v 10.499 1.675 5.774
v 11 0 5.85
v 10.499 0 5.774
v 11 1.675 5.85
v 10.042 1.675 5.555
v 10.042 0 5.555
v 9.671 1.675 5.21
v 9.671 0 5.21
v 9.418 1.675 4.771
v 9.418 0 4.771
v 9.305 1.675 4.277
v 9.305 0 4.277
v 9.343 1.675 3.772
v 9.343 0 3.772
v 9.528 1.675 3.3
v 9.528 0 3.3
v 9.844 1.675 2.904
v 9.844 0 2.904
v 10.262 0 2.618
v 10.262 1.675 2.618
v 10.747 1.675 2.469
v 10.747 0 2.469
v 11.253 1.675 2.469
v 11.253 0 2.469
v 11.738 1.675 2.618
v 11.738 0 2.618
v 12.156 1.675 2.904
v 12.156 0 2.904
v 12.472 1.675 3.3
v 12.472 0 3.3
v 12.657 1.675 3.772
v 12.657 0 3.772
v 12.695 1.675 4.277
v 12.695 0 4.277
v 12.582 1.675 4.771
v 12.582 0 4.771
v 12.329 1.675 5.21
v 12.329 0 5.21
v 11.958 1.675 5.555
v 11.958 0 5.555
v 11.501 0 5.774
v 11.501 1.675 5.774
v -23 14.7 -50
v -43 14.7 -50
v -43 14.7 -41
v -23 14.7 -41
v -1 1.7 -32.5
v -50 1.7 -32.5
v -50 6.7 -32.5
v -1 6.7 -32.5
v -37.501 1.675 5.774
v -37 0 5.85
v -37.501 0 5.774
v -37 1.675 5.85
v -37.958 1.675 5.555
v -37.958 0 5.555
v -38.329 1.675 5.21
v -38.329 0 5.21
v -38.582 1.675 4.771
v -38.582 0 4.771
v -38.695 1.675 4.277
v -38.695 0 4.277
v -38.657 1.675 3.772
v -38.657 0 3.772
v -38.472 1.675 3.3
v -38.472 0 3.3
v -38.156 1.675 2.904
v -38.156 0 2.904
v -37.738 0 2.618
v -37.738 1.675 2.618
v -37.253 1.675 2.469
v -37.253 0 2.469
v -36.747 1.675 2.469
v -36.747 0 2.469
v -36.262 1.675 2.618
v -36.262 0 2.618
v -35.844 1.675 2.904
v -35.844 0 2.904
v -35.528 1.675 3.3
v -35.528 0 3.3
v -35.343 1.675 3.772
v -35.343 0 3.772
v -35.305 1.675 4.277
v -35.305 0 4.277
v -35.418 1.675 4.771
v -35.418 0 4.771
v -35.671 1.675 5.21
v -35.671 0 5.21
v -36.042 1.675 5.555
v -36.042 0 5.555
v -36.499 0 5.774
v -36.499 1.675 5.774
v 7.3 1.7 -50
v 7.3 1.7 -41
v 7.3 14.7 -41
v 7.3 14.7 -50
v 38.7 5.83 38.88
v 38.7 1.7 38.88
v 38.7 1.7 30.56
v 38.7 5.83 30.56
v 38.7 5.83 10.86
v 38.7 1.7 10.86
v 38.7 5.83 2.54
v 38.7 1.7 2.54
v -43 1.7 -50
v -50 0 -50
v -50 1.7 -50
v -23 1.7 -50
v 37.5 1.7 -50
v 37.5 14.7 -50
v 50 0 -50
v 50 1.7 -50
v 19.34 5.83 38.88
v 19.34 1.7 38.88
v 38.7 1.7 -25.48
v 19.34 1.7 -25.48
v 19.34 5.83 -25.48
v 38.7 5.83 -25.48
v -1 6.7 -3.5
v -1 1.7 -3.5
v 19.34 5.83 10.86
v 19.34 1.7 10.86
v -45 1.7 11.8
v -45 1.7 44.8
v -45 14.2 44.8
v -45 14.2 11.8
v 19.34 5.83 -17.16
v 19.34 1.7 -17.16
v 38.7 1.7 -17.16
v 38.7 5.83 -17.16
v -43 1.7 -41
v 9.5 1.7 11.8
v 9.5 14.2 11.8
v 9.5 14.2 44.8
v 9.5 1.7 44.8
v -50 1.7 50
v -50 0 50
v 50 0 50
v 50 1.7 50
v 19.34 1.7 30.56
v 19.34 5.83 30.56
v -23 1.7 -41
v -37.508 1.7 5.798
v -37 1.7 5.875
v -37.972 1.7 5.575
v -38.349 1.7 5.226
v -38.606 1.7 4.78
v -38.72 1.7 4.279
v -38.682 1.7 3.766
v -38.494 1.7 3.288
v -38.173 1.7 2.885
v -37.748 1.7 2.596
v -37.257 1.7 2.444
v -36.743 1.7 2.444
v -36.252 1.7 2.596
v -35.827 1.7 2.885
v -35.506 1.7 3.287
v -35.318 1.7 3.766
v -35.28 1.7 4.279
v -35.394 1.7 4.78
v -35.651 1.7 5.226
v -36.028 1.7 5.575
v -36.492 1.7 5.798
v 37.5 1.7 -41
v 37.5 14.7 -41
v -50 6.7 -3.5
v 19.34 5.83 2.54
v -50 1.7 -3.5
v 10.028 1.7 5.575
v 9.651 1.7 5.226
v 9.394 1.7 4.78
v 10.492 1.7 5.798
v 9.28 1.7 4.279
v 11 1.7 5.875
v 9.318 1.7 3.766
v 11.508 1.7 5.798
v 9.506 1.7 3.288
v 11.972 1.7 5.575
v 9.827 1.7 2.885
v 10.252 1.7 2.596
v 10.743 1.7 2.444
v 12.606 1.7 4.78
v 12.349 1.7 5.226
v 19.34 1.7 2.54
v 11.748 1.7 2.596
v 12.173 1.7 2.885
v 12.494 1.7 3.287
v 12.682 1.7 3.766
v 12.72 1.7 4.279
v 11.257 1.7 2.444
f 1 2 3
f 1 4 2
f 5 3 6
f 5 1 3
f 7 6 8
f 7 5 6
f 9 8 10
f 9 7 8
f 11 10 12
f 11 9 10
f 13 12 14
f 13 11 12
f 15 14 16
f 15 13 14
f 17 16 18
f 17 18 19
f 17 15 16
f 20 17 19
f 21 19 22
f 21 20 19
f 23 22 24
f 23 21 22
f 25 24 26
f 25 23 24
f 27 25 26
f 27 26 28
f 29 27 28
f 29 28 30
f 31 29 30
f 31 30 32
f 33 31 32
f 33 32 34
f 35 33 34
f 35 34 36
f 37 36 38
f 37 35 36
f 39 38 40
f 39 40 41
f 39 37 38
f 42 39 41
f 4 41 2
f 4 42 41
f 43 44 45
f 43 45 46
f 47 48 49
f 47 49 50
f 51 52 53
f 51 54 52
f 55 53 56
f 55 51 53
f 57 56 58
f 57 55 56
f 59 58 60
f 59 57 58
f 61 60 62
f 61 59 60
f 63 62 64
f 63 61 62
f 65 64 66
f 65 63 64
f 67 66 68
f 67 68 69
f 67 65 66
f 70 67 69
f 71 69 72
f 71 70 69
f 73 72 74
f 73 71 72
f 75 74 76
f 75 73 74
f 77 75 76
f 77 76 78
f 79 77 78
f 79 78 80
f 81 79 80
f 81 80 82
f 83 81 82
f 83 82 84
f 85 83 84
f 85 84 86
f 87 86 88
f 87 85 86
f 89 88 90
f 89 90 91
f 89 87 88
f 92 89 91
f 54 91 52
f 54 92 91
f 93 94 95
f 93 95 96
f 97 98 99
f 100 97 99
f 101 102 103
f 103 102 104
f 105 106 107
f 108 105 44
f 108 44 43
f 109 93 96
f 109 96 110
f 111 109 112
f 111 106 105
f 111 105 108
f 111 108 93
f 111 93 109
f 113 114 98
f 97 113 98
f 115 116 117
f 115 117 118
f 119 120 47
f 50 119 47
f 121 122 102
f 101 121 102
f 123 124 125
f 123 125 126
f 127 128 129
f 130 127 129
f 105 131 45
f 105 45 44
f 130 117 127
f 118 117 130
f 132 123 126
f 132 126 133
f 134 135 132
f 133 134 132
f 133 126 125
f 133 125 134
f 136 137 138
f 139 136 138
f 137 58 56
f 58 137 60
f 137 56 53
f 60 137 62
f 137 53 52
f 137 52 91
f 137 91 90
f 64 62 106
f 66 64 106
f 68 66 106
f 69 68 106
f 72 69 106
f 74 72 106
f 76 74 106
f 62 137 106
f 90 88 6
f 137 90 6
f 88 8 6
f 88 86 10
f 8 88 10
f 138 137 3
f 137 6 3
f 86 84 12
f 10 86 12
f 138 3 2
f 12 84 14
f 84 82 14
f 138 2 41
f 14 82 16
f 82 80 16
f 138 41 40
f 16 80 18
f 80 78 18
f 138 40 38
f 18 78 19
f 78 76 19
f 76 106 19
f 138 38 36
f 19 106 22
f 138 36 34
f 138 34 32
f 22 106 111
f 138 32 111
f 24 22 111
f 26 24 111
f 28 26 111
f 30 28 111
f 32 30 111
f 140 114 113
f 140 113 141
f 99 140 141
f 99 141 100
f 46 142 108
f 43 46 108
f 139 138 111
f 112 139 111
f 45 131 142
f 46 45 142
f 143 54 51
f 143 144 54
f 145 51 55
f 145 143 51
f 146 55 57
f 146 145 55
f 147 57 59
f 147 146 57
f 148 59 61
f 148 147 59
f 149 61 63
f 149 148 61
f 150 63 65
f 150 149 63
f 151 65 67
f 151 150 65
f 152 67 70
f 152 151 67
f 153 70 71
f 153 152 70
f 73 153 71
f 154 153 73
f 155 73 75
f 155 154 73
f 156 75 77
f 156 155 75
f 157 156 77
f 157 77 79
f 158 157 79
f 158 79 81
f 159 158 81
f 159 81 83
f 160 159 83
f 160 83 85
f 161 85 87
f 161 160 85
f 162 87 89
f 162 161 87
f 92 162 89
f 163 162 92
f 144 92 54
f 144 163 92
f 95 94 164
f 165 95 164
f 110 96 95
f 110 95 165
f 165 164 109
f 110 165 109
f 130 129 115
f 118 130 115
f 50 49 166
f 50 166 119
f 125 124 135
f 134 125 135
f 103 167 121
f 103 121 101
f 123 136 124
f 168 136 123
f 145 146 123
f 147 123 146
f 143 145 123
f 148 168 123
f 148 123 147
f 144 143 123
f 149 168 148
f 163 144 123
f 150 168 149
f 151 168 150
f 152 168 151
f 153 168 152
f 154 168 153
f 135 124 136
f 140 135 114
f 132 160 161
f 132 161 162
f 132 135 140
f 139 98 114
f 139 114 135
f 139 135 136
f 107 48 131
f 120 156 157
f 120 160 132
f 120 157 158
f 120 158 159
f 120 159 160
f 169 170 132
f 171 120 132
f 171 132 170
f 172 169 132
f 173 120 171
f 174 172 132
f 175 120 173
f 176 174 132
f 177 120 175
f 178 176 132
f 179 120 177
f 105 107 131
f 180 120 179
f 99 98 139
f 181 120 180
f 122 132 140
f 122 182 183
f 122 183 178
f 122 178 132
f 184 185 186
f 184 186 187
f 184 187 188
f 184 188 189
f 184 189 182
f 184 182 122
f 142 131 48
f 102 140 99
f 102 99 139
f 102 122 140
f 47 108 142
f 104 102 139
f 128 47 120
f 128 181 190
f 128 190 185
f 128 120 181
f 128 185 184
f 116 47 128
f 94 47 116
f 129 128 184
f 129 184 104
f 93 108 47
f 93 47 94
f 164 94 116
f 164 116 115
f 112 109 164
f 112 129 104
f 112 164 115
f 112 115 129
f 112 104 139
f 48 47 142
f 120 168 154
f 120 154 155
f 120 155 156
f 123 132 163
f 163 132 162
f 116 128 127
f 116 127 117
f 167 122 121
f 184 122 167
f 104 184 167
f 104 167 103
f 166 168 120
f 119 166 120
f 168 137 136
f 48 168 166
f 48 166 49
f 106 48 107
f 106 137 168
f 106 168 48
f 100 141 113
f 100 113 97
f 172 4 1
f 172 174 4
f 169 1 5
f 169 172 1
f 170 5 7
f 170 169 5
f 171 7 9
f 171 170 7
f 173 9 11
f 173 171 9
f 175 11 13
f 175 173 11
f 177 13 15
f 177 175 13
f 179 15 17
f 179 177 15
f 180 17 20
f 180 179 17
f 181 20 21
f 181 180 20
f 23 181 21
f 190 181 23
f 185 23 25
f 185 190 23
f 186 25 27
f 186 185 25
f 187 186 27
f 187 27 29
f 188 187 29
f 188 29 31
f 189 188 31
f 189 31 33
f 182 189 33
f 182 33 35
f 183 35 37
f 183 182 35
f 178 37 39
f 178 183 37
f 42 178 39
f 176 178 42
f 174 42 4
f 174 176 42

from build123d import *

# Parameters (mm, degrees)
SKETCH1_W                     = 100
SKETCH1_H                     = 100
BOSS_EXTRUDE1_DEPTH           = 1.7
SKETCH2_W                     = 30.2
SKETCH2_H                     = 9
SKETCH2_W_2                   = 20
BOSS_EXTRUDE2_DEPTH           = 13
SKETCH3_W                     = 49
SKETCH3_H                     = 29
BOSS_EXTRUDE3_DEPTH           = 5
SKETCH4_W                     = 19.36
SKETCH4_H                     = 8.32
BOSS_EXTRUDE4_DEPTH           = 4.13
SKETCH5_W                     = 54.5
SKETCH5_H                     = 33
BOSS_EXTRUDE5_DEPTH           = 12.5
M3_CLEARANCE_HOLE1_AT_2_COUNT = 2
M3_CLEARANCE_HOLE1_AT_2_PITCH = 48


with BuildPart() as part:
    # Sketch1 → Boss-Extrude1 (new body)
    with BuildSketch(Plane(origin=(0, 0, 0), x_dir=(1, 0, 0), z_dir=(0, 1, 0))):
        Rectangle(SKETCH1_W, SKETCH1_H)
    extrude(amount=BOSS_EXTRUDE1_DEPTH)

    # Sketch2 → Boss-Extrude2 (add)
    with BuildSketch(Plane(origin=(0, 1.7, 0), x_dir=(1, 0, 0), z_dir=(0, 1, 0))):
        with Locations((22.4, 45.5)):
            Rectangle(SKETCH2_W, SKETCH2_H)
        with Locations((-33, 45.5)):
            Rectangle(SKETCH2_W_2, SKETCH2_H)
    extrude(amount=BOSS_EXTRUDE2_DEPTH)

    # Sketch3 → Boss-Extrude3 (add)
    with BuildSketch(Plane(origin=(0, 1.7, 0), x_dir=(1, 0, 0), z_dir=(0, 1, 0))):
        with Locations((-25.5, 18)):
            Rectangle(SKETCH3_W, SKETCH3_H)
    extrude(amount=BOSS_EXTRUDE3_DEPTH)

    # Sketch4 → Boss-Extrude4 (add)
    with BuildSketch(Plane(origin=(0, 1.7, 0), x_dir=(1, 0, 0), z_dir=(0, 1, 0))):
        with Locations((29.02, 21.32)):
            Rectangle(SKETCH4_W, SKETCH4_H)
        with Locations((29.02, -6.7)):
            Rectangle(SKETCH4_W, SKETCH4_H)
        with Locations((29.02, -34.72)):
            Rectangle(SKETCH4_W, SKETCH4_H)
    extrude(amount=BOSS_EXTRUDE4_DEPTH)

    # Sketch5 → Boss-Extrude5 (add)
    with BuildSketch(Plane(origin=(0, 1.7, 0), x_dir=(1, 0, 0), z_dir=(0, 1, 0))):
        with Locations((-17.75, -28.3)):
            Rectangle(SKETCH5_W, SKETCH5_H)
    extrude(amount=BOSS_EXTRUDE5_DEPTH)

    # Sketch9 → M3 Clearance Hole1 (revolve, cut)
    with BuildSketch(Plane(origin=(-37, 1.7, 4.15), x_dir=(0, 0, 1), z_dir=(1, 0, 0))):
        Polygon((0, 0), (0, 1.7), (1.7, 1.7), (1.7, 0.025), (1.725, 0), align=None)
    m3_clearance_hole1 = revolve(axis=Axis((-37, 8.05, 4.15), (0, -1, 0)), mode=Mode.SUBTRACT)

    # M3 Clearance Hole1 at 2: M3 Clearance Hole1 ×2
    with Locations(*[(i * M3_CLEARANCE_HOLE1_AT_2_PITCH, 0, 0) for i in range(1, M3_CLEARANCE_HOLE1_AT_2_COUNT)]):
        add(m3_clearance_hole1, mode=Mode.SUBTRACT)


solid = part.part
